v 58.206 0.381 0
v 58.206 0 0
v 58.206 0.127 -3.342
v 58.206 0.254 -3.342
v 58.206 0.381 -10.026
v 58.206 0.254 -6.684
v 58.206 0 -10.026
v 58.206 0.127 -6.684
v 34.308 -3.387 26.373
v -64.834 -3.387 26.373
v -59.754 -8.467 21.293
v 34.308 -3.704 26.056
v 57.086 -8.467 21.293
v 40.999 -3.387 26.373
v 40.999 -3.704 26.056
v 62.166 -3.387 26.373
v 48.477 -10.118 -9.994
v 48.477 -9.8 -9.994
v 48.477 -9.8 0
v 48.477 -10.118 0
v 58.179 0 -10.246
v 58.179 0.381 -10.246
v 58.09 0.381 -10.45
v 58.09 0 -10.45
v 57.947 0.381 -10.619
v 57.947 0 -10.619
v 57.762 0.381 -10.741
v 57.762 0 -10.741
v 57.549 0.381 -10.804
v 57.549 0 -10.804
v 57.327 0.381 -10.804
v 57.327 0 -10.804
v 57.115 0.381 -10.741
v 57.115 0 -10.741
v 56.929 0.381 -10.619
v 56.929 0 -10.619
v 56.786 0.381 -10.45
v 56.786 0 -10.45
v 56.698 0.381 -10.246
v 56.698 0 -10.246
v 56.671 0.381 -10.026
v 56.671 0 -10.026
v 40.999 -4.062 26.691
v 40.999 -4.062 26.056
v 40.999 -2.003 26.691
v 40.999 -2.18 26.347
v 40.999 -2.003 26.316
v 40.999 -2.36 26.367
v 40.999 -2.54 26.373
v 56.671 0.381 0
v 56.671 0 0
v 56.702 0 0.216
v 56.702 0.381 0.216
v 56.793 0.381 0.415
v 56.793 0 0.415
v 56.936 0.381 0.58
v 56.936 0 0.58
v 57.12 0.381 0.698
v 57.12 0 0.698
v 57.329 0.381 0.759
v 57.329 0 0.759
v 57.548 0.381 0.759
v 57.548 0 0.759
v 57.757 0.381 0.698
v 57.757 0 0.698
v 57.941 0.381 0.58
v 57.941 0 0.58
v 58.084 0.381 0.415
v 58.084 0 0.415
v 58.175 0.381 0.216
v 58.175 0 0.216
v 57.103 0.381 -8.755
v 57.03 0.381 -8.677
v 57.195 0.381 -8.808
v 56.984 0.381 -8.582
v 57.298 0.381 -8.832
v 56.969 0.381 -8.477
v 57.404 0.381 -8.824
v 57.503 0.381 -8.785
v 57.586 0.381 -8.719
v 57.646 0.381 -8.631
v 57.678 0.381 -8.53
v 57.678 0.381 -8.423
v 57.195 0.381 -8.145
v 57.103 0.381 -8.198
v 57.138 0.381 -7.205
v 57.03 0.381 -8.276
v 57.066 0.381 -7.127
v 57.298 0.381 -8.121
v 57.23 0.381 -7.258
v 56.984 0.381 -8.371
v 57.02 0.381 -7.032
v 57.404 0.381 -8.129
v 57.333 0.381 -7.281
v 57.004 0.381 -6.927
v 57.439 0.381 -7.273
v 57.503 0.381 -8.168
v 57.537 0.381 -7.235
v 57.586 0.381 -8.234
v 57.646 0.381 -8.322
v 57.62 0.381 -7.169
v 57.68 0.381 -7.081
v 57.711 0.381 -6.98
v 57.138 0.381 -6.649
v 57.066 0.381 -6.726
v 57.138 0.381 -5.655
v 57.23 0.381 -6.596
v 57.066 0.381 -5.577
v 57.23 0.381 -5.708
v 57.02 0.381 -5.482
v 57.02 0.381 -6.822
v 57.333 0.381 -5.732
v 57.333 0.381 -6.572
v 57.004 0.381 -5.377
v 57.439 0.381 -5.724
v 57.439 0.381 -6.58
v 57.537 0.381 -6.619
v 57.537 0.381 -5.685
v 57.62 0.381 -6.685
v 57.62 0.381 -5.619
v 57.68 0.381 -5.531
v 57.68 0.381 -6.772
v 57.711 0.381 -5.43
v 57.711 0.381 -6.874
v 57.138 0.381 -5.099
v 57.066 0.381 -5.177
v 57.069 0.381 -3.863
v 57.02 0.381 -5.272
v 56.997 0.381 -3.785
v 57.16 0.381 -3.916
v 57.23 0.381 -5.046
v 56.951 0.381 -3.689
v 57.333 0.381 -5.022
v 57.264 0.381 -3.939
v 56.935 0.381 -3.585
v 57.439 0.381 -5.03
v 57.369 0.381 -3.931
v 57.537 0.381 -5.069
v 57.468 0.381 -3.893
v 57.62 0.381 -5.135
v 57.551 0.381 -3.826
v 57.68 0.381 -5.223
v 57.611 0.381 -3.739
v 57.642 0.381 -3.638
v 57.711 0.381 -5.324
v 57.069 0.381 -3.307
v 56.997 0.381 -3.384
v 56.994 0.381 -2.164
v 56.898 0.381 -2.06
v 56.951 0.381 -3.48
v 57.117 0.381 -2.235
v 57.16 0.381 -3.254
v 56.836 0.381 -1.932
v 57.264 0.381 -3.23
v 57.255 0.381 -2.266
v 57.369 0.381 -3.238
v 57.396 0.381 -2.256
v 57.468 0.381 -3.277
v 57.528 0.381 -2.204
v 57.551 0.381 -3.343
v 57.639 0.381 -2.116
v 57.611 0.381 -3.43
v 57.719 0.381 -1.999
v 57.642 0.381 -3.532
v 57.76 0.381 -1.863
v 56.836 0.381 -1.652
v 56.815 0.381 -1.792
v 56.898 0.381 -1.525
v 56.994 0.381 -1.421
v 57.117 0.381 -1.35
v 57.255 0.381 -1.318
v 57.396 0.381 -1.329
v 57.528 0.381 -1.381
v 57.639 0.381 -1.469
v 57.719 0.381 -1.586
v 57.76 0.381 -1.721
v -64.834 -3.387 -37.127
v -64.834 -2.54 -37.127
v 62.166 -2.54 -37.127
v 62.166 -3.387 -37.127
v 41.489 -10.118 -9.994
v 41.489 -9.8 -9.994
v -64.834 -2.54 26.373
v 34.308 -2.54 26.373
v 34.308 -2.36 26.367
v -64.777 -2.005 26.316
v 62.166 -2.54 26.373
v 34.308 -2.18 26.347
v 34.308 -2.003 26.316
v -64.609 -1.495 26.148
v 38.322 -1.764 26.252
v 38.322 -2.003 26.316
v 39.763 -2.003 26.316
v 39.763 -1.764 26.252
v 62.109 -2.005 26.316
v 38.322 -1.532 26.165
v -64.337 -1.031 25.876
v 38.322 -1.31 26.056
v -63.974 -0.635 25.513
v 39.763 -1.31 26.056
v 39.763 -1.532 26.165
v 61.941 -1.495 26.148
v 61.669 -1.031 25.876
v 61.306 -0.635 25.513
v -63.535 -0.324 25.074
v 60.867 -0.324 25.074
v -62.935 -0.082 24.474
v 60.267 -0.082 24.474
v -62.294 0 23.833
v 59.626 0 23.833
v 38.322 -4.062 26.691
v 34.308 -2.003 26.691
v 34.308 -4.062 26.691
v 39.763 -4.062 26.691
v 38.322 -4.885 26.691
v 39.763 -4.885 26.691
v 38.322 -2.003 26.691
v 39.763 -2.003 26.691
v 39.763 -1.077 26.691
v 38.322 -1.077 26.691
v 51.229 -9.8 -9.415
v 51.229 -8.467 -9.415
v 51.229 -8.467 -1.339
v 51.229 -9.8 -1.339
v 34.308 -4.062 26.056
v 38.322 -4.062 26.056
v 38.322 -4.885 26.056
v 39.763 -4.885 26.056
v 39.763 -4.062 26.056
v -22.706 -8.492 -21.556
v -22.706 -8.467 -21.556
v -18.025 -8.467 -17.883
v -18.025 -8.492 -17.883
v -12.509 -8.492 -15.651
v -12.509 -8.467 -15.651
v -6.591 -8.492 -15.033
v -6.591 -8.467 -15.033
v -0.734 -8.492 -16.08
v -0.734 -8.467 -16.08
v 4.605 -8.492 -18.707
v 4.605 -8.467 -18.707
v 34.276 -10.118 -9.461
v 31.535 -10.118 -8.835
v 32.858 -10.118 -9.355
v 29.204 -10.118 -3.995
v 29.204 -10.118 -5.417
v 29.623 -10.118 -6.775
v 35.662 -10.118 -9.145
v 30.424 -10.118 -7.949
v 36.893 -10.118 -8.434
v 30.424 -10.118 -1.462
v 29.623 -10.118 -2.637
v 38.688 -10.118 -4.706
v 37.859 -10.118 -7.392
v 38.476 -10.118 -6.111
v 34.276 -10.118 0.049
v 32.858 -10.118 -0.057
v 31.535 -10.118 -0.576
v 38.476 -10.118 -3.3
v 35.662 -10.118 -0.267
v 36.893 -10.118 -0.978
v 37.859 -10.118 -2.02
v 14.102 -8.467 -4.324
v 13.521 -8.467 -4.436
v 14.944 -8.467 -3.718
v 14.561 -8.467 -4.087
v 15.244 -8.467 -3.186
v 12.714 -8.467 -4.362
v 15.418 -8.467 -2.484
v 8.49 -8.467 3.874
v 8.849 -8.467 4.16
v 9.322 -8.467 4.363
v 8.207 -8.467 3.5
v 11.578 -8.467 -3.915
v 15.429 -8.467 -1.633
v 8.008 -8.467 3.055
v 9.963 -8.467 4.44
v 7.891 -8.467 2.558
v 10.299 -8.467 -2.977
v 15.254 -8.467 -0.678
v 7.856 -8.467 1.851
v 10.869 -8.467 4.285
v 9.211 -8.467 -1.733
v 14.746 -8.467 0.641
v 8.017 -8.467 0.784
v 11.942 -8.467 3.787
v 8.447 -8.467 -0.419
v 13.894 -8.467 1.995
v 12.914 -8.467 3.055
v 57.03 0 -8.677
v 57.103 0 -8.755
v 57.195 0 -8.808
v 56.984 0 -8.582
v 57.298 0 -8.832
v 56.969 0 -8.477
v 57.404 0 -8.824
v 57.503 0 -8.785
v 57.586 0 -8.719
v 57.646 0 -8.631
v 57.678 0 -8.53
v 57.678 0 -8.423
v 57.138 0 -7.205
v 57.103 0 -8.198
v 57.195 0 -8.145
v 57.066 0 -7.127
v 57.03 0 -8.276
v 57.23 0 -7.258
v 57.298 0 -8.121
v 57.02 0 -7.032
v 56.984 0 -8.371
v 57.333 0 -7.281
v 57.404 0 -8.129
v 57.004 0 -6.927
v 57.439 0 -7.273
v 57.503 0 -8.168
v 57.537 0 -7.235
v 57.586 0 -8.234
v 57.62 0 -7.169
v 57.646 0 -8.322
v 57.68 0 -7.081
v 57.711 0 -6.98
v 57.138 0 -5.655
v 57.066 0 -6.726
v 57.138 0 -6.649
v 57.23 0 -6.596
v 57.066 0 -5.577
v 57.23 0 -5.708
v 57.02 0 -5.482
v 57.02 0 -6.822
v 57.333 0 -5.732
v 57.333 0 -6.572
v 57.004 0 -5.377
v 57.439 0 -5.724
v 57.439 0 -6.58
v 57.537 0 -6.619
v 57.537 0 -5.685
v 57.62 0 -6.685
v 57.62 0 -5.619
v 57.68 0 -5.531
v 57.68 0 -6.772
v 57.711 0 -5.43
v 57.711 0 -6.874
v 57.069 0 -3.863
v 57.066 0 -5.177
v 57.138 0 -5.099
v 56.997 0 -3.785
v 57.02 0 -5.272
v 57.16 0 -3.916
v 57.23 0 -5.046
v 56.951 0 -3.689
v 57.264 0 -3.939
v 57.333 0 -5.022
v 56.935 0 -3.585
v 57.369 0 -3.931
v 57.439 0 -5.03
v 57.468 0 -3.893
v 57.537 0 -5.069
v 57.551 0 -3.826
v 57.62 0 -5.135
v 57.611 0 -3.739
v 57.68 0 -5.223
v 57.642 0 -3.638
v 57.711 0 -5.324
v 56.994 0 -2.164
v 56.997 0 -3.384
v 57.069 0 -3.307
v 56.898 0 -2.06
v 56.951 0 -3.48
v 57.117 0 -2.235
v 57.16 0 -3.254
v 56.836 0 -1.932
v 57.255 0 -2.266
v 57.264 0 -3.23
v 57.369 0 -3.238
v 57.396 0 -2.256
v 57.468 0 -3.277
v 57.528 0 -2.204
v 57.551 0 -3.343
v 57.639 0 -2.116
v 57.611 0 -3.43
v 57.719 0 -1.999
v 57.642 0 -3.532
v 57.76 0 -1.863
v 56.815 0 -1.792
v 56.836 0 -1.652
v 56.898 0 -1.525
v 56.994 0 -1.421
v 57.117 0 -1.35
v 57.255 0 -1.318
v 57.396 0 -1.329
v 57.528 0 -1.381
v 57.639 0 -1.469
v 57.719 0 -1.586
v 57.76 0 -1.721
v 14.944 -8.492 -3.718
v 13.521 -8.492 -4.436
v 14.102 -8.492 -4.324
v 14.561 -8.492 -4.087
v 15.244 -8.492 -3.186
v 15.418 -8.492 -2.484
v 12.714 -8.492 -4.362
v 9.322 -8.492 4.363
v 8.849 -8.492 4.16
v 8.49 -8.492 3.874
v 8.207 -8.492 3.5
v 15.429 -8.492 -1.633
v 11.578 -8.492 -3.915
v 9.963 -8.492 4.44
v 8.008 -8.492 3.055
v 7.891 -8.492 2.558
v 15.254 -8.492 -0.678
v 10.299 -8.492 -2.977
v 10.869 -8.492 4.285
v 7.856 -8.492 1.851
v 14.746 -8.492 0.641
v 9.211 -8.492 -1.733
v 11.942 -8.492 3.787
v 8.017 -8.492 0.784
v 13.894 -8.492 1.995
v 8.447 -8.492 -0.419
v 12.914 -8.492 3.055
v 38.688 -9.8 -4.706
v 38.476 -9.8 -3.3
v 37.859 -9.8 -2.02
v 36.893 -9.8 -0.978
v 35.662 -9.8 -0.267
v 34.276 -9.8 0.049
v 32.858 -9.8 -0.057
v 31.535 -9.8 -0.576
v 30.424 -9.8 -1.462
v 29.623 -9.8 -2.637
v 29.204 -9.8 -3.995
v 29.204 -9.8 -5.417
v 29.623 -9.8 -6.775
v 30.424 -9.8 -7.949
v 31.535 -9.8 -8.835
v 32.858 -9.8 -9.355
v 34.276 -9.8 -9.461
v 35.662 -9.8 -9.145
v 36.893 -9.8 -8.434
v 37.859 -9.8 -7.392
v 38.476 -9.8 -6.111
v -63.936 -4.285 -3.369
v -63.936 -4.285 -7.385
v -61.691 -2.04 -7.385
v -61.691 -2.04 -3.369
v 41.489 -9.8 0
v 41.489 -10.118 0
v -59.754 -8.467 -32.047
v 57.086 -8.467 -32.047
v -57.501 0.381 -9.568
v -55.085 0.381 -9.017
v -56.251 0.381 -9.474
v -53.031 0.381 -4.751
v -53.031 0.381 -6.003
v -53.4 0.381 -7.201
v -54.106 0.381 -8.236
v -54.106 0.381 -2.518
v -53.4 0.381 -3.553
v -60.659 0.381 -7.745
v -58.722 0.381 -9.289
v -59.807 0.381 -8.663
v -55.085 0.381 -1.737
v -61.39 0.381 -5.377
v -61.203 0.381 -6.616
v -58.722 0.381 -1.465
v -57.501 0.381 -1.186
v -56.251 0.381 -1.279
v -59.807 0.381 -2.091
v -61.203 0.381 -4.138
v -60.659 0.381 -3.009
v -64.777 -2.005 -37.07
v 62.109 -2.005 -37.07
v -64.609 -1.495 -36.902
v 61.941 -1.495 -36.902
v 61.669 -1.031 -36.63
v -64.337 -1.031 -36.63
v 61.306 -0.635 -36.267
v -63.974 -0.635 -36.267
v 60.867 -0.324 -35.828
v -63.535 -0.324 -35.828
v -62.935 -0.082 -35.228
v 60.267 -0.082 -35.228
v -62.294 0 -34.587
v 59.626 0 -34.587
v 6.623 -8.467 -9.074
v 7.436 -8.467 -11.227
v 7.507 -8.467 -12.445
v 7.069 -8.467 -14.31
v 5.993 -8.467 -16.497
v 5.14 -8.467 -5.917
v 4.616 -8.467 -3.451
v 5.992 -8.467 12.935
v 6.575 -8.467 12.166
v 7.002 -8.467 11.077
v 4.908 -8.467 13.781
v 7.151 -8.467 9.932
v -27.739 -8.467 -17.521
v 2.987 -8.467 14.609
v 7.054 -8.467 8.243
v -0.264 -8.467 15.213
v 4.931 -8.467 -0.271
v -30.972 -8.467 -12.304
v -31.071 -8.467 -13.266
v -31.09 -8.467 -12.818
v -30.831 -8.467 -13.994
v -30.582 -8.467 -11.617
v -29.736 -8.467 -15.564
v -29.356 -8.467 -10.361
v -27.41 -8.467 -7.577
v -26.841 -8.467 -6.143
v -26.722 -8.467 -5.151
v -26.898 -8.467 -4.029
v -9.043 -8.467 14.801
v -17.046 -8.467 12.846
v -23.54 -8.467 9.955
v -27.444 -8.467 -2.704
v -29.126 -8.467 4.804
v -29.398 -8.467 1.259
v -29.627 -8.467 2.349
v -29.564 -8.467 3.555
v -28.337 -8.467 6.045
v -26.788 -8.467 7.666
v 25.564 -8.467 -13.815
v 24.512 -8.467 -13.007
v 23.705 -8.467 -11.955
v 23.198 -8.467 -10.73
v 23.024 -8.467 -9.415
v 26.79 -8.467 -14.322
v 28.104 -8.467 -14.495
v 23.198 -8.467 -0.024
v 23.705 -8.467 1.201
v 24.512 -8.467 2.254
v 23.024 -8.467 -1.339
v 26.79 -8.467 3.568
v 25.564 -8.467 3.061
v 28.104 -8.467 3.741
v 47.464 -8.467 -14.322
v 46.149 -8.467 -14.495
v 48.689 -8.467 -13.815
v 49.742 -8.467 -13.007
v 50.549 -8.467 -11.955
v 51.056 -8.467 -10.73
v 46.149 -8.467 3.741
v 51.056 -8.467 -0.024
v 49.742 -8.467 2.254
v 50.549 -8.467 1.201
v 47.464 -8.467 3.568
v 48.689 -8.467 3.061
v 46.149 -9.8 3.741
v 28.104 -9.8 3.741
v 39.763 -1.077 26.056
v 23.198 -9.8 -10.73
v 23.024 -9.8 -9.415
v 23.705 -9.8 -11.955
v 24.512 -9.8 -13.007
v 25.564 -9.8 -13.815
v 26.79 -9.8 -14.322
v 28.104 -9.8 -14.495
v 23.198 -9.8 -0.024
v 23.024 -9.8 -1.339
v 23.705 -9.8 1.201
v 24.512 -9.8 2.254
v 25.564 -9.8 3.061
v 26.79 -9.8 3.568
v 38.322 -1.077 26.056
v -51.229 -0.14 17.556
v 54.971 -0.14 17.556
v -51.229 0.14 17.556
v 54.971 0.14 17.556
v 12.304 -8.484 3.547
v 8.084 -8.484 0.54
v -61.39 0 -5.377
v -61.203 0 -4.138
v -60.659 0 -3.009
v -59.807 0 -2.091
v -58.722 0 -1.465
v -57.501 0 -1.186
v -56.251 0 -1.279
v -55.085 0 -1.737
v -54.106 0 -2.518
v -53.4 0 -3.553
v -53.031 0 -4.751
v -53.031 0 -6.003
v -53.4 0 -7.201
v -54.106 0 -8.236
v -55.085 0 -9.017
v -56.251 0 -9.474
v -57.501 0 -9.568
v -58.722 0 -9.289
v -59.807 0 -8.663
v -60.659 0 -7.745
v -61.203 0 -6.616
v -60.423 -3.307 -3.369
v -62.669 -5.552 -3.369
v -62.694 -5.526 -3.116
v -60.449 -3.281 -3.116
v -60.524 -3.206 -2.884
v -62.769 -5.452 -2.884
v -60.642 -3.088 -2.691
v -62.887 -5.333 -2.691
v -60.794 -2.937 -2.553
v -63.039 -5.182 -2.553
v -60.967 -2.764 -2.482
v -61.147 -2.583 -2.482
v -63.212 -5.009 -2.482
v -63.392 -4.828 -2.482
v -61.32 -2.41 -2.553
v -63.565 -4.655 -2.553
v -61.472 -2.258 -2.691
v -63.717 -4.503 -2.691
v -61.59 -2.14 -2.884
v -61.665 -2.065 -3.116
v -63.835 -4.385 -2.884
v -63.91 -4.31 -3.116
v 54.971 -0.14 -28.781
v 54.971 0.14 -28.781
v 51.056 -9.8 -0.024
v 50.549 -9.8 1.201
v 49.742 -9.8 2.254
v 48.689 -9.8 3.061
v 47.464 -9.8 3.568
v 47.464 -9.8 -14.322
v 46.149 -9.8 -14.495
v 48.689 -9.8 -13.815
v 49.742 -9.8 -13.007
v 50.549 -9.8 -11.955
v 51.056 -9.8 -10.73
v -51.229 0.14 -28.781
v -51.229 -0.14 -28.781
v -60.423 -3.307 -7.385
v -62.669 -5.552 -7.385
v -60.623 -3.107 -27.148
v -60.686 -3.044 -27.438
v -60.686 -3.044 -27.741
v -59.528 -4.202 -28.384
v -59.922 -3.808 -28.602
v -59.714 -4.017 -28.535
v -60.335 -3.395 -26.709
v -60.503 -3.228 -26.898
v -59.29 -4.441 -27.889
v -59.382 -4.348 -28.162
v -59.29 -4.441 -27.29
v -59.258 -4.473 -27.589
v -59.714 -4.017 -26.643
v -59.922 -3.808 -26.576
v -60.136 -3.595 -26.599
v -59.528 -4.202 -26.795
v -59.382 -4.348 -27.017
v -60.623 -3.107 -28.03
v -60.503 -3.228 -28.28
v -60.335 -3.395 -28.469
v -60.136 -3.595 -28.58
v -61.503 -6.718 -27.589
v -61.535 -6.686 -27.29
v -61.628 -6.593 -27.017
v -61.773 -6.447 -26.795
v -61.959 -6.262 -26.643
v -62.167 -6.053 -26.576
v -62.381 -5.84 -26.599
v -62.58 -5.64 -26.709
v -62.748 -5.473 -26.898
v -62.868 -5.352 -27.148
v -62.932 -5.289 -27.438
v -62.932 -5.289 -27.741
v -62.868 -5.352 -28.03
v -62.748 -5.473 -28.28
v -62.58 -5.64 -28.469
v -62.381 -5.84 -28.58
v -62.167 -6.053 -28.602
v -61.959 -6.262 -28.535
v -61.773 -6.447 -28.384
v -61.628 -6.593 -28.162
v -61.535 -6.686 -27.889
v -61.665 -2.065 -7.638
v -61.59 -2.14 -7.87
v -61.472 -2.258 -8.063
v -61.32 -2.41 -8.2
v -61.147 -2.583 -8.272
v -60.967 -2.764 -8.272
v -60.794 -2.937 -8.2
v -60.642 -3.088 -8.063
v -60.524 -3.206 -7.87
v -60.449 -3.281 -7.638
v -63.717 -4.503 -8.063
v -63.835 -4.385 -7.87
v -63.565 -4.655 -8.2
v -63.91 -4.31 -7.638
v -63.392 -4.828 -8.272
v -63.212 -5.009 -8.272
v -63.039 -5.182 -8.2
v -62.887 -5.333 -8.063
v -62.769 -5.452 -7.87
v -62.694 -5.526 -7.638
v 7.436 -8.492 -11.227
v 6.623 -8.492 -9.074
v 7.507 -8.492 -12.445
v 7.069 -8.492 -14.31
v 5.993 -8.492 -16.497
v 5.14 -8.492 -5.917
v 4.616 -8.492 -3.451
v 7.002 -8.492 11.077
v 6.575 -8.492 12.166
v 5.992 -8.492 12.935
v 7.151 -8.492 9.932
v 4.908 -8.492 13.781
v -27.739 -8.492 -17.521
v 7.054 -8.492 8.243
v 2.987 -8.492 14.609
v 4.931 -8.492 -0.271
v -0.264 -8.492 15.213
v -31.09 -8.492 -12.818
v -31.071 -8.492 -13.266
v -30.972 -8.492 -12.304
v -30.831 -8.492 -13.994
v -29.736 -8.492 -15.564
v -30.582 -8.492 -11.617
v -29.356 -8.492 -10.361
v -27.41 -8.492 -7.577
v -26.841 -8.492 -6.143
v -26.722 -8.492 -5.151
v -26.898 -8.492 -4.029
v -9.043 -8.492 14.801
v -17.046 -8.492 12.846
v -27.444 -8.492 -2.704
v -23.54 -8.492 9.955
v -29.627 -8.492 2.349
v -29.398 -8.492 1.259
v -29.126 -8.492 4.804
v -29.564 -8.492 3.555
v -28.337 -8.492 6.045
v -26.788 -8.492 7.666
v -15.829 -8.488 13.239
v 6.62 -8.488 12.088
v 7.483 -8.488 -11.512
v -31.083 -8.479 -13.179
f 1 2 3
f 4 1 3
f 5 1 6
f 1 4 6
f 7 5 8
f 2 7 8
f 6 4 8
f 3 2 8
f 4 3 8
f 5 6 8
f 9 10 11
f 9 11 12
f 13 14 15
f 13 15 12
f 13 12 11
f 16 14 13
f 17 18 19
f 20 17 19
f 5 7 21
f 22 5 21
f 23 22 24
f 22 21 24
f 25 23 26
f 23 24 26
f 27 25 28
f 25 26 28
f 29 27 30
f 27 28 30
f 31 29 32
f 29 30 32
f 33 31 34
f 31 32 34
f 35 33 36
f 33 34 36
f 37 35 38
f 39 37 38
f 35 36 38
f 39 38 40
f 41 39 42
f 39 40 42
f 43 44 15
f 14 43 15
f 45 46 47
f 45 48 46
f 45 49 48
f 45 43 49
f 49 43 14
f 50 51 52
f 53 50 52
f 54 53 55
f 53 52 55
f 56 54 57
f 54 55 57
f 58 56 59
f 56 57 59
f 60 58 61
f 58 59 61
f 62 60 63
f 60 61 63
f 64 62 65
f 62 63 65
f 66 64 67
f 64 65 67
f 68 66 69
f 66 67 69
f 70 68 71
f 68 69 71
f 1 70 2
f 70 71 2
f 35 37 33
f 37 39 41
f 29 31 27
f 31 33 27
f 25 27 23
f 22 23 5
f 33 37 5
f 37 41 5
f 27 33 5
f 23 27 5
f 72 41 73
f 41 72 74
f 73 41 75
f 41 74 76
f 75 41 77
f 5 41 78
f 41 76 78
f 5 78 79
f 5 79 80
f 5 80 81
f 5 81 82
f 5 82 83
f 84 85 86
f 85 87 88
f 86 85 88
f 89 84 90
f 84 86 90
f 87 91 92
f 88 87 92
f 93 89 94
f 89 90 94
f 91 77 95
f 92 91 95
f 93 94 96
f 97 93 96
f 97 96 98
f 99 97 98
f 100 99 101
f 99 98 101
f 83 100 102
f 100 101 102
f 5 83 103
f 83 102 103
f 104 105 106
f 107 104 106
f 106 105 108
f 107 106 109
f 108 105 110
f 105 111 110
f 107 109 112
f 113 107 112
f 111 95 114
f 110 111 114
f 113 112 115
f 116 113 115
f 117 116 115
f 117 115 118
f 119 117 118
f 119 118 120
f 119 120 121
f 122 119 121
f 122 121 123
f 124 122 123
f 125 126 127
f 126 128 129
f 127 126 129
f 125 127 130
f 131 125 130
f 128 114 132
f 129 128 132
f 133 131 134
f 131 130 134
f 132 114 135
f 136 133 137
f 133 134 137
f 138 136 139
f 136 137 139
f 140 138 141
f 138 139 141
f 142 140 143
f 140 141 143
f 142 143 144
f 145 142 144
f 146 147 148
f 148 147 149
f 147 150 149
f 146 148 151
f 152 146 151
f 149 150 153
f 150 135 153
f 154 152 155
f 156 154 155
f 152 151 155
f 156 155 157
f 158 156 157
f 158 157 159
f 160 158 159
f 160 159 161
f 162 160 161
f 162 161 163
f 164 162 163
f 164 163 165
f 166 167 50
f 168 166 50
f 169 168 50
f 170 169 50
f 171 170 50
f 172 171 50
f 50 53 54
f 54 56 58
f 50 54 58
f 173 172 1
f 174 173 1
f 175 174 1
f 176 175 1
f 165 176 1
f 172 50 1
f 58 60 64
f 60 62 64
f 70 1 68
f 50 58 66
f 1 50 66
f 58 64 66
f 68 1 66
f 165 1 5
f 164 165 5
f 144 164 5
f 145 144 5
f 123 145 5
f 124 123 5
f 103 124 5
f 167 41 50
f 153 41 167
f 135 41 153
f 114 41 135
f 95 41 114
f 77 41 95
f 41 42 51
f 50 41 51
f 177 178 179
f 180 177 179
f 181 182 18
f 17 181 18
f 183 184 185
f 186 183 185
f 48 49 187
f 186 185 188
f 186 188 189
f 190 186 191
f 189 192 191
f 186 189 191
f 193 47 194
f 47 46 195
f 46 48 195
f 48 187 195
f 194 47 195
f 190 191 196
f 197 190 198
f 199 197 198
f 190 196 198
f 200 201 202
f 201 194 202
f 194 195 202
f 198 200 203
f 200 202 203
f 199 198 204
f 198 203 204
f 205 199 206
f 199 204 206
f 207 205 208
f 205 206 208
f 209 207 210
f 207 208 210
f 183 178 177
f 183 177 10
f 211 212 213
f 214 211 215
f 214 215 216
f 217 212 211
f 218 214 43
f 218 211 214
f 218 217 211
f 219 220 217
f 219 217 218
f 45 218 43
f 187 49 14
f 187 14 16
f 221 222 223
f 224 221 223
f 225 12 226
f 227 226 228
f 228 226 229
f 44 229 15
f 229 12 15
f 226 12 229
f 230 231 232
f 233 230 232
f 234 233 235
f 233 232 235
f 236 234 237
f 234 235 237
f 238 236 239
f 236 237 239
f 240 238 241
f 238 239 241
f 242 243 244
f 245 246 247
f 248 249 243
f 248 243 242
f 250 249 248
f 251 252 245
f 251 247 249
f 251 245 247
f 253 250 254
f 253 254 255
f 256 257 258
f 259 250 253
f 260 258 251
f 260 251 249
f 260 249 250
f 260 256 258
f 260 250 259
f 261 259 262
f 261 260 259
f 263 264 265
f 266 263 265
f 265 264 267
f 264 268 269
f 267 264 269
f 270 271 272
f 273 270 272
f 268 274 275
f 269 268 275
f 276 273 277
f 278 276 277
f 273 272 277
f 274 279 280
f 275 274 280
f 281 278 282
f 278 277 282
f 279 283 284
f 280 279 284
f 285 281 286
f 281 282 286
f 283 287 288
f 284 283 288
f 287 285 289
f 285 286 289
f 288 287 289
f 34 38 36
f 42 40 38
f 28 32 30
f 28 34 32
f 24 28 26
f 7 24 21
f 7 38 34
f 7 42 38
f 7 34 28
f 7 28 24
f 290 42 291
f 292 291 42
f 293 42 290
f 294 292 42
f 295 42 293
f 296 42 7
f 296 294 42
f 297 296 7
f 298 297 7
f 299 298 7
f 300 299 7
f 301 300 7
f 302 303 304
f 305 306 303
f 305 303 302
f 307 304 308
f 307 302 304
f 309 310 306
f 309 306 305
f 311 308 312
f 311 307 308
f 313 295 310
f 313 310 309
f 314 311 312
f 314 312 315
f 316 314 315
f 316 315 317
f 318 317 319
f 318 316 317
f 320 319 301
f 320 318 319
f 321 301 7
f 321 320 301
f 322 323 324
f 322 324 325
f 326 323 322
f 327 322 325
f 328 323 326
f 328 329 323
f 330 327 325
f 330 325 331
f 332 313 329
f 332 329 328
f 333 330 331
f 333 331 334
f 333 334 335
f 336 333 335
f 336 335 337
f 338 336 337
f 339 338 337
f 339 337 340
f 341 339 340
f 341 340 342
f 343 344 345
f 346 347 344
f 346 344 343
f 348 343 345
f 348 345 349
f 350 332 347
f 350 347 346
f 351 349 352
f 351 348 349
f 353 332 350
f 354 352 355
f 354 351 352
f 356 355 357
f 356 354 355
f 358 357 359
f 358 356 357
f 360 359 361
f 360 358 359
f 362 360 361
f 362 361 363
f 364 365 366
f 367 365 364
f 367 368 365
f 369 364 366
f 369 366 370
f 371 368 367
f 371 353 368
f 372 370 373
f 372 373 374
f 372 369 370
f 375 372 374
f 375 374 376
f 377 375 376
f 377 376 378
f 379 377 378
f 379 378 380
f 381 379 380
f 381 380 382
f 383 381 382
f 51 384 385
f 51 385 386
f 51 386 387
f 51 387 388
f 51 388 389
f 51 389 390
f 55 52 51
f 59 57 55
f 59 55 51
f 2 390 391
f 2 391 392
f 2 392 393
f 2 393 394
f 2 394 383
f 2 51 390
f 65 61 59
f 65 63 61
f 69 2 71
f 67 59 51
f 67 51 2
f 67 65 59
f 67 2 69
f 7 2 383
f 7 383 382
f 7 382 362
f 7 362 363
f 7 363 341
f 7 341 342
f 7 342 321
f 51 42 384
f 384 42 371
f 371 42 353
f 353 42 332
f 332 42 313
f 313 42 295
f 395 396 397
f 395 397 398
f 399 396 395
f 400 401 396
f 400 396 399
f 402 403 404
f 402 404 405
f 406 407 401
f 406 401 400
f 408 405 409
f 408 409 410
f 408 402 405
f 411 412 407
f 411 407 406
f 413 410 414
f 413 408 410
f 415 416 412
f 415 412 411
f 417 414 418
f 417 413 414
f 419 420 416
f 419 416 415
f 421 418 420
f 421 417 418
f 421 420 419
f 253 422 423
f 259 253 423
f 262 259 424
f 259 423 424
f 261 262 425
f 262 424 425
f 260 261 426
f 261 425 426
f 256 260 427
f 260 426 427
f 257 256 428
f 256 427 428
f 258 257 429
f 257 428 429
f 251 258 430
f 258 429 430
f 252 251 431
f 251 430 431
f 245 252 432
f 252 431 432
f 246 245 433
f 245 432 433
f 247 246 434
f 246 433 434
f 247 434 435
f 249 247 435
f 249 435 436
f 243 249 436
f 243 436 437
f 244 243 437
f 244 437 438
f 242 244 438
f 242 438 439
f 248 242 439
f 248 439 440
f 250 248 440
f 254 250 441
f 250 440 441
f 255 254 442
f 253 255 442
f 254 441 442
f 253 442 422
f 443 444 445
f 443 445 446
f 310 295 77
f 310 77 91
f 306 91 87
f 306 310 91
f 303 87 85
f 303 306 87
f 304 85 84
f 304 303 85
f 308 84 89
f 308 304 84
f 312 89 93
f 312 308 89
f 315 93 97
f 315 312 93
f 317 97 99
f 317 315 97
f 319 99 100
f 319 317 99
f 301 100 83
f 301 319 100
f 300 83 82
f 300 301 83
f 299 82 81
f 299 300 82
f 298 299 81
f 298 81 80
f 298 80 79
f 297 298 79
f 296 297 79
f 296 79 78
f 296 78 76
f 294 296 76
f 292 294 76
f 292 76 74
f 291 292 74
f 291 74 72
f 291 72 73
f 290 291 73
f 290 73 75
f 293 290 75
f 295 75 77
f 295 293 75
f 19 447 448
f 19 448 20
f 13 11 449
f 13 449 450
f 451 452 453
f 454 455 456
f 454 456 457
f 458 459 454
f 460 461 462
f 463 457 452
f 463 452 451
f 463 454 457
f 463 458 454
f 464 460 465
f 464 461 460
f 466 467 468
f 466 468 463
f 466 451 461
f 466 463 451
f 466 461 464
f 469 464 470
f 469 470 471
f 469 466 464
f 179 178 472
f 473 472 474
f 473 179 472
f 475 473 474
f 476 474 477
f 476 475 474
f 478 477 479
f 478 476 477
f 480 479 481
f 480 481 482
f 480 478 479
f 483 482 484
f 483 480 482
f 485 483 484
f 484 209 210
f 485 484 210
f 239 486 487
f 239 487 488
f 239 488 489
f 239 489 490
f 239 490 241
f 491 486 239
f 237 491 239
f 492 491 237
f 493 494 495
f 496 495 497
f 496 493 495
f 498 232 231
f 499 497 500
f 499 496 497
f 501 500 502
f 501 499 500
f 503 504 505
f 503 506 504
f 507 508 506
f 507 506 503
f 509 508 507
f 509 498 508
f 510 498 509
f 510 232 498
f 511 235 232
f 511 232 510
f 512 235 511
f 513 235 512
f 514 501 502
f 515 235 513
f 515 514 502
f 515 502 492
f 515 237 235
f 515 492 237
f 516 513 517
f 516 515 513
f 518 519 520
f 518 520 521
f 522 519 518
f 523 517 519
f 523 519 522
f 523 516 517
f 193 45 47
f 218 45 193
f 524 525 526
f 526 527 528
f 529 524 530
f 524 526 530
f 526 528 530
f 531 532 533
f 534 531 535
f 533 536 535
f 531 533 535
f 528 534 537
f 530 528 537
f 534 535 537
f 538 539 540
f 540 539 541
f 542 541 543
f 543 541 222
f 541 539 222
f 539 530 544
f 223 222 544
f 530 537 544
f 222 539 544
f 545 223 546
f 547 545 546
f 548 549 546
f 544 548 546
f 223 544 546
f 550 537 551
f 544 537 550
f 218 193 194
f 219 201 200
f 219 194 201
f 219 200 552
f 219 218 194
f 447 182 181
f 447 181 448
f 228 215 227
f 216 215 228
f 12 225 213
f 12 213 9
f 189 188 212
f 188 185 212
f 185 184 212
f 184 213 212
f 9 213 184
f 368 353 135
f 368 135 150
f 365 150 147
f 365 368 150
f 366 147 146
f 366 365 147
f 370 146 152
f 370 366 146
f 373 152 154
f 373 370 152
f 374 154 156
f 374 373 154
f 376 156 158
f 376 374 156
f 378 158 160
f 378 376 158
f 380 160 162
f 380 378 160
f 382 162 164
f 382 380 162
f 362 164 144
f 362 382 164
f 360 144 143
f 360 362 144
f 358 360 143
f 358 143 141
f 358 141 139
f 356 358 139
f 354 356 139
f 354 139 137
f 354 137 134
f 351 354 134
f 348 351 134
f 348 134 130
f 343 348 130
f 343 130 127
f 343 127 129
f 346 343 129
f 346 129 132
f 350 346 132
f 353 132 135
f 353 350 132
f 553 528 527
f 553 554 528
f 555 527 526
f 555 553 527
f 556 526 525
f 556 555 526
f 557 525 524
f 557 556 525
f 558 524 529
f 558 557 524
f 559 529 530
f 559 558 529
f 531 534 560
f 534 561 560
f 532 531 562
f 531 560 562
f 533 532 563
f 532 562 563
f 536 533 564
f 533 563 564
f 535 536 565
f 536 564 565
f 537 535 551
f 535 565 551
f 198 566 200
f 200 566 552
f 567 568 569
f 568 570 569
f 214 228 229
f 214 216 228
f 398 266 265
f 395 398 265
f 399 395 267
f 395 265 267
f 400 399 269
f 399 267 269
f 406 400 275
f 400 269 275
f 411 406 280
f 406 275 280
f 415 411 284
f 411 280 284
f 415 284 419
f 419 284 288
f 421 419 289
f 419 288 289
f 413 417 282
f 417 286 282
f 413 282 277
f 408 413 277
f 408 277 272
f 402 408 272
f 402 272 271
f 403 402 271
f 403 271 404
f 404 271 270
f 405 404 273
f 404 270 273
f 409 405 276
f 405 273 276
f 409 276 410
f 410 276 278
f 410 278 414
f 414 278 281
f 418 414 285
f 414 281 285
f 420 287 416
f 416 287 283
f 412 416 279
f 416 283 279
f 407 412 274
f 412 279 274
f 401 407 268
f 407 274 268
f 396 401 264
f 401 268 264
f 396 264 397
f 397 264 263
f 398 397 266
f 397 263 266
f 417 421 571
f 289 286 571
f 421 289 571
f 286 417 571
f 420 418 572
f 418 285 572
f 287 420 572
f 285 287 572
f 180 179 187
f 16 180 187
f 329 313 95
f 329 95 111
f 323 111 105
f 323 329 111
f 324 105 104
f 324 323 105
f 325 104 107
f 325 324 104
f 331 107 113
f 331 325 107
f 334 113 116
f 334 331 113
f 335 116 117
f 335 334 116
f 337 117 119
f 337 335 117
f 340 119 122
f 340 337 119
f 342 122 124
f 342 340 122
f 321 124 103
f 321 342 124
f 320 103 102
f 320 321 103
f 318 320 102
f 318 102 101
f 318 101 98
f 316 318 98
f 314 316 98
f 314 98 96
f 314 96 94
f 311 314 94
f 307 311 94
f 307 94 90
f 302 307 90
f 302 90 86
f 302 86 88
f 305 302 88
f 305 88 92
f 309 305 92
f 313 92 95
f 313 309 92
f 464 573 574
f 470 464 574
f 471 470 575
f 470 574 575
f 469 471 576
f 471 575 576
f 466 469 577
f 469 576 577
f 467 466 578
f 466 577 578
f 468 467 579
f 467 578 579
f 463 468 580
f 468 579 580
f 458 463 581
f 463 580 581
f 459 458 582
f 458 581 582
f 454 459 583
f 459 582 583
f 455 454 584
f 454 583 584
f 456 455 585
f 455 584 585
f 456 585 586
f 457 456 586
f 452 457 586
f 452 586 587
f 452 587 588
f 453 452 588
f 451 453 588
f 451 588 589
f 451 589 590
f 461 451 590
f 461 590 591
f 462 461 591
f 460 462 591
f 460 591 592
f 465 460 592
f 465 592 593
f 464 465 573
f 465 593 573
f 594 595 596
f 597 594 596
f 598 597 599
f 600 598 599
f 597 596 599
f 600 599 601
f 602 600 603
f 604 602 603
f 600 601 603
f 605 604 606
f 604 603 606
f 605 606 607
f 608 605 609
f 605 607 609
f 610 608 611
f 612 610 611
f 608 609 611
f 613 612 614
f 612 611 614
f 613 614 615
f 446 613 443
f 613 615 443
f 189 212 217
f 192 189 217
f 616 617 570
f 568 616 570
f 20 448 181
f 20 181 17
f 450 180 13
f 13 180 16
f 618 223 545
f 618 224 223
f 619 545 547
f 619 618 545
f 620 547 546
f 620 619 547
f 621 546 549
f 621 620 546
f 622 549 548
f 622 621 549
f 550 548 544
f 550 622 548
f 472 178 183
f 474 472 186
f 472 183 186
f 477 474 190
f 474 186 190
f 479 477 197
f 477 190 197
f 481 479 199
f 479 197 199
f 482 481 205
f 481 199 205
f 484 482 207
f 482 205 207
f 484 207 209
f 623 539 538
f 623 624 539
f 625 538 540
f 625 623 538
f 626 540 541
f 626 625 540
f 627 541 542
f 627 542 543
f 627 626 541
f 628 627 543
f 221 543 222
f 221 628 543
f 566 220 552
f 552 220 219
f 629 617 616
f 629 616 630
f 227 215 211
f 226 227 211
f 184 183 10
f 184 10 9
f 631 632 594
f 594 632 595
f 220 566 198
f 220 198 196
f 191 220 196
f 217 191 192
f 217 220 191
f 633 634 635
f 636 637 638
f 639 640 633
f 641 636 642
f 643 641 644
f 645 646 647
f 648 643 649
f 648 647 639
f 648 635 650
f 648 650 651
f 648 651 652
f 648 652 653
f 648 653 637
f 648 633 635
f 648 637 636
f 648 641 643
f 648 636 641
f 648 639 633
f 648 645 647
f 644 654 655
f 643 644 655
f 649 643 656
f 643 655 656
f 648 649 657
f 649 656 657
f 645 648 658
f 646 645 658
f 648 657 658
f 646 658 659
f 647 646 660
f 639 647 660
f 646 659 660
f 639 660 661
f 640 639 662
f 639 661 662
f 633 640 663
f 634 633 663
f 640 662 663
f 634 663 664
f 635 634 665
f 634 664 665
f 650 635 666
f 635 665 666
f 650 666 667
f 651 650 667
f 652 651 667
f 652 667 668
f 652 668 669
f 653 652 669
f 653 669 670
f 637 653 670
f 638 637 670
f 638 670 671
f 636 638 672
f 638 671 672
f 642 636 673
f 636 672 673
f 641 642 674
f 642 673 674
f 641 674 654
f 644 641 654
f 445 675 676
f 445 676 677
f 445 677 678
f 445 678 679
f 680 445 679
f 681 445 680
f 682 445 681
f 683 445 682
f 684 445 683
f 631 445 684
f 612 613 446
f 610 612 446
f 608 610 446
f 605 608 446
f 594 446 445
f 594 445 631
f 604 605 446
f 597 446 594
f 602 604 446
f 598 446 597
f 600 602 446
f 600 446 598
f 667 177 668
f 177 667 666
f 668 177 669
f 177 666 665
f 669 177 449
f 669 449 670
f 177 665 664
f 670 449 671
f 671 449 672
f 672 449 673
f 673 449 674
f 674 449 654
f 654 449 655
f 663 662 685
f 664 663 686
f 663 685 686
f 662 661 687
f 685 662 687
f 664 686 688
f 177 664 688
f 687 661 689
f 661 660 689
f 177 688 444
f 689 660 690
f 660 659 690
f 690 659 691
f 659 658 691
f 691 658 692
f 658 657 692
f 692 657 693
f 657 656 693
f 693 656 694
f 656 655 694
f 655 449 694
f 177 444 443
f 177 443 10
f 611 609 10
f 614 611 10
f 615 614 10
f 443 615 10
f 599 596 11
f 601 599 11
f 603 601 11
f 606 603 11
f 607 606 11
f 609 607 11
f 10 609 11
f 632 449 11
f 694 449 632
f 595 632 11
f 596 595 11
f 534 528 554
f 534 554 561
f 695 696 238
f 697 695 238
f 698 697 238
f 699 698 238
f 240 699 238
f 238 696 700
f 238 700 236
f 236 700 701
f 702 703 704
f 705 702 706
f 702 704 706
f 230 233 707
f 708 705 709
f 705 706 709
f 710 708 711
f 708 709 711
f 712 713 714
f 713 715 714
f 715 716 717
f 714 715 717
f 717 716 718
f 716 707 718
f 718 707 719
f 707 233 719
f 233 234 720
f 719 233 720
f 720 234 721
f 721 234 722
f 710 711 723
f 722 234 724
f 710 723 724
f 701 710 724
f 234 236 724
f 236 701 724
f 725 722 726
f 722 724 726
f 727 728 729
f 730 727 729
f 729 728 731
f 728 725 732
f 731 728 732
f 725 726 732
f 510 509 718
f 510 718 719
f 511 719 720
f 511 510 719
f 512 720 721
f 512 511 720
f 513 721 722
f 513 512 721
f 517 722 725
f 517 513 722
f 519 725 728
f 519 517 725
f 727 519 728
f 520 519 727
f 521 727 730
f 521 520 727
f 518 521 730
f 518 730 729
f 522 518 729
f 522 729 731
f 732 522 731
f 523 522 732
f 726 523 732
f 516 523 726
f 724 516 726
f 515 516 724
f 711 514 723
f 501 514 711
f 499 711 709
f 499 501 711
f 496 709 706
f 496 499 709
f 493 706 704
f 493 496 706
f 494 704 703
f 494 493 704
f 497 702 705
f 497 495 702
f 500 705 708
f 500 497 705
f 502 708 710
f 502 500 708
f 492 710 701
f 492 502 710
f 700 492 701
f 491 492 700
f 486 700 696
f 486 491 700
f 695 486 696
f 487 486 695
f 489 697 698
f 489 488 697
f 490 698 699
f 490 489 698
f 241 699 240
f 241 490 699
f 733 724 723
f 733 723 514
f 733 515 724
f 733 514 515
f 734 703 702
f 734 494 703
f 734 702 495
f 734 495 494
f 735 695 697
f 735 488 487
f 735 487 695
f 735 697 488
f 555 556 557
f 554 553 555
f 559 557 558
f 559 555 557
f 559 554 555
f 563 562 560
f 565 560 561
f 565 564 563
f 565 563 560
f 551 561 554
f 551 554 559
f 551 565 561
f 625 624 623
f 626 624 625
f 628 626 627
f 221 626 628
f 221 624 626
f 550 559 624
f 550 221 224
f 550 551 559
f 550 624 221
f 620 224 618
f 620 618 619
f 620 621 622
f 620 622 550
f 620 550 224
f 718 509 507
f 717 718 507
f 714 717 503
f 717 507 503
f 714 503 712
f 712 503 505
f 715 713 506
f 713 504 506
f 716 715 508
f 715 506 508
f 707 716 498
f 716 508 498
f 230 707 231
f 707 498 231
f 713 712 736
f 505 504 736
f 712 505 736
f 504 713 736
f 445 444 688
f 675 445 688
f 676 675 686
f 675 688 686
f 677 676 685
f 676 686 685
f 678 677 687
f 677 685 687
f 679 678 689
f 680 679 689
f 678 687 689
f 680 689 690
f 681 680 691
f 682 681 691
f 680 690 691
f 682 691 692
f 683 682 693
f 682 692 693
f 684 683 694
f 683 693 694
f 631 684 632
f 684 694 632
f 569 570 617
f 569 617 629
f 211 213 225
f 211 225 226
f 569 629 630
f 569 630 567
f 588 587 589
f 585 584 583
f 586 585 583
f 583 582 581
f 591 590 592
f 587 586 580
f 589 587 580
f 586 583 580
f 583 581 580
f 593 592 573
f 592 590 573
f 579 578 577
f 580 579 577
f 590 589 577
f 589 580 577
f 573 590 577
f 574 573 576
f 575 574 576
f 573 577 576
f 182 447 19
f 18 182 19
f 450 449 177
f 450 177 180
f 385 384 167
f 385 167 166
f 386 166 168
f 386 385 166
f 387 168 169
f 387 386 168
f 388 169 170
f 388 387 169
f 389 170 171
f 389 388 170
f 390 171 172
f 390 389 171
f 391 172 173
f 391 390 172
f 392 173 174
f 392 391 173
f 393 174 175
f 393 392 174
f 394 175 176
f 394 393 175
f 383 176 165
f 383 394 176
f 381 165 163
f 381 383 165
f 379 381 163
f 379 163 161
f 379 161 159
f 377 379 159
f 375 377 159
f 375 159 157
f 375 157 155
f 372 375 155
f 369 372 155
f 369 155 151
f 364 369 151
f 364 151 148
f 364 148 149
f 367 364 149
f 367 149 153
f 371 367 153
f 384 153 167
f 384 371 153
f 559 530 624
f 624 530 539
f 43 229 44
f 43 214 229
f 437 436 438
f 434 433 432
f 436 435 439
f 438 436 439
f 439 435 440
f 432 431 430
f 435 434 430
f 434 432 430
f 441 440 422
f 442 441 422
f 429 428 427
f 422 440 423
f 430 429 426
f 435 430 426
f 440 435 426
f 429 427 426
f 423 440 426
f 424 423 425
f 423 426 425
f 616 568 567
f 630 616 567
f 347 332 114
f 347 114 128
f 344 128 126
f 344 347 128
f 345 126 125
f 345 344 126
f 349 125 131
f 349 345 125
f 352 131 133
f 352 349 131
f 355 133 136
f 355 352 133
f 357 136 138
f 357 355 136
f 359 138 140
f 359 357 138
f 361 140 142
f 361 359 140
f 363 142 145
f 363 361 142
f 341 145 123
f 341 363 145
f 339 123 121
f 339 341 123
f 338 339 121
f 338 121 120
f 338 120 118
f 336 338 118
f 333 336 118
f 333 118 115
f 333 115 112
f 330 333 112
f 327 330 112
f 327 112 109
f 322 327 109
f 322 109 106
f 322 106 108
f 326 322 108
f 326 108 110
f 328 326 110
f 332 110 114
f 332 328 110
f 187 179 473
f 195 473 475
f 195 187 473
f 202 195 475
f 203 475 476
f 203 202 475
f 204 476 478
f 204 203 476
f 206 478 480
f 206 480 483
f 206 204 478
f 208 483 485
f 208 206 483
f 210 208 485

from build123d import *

# Parameters (mm, degrees)
F0_W      = 127
F0_H      = 63.5
F1_DEPTH  = 8.4666666667
F2_R      = 2.54
F3_W      = 106.2003225088
F3_H      = 46.3367272168
F4_DEPTH  = 0.1397
F5_SIZE   = 5.08
F6_R      = 4.2028856968
F7_DEPTH  = 0.381
F8_R      = 0.356508333
F8_R_2    = 0.3556
F8_R_3    = 0.4752442837
F9_DEPTH  = 0.381
F10_W     = 28.2049626112
F10_H     = 18.2368370481
F11_DEPTH = 1.3335
F12_R     = 5.08
F13_W     = 6.9876015186
F13_H     = 9.993921034
F14_DEPTH = 0.3175
F13_R     = 4.7685535727
F15_W     = 1.7923414707
F15_H     = 4.0167168006
F16_DEPTH = 3.175
F17_R     = 1.016
F18_DEPTH = 3.175
F19_W     = 1.2352466583
F19_H     = 2.0587400068
F19_W_2   = 1.4411173761
F19_H_2   = 0.9264331311
F19_W_3   = 4.014544189
F19_H_3   = 0.8234963752
F20_DEPTH = 0.3175
F22_DEPTH = 0.0254


with BuildPart() as f1:
    # F0 (on Front) → F1 (new body)
    with BuildSketch(Plane.XZ):
        with Locations((-1.3339536488, -5.376943469)):
            Rectangle(F0_W, F0_H)
    extrude(amount=F1_DEPTH)

    # F2
    f2_edges = [f1.edges().sort_by_distance(p)[0] for p in [
        (-1.333954, 0, 26.373057),
        (-64.833954, 0, -5.376943),
        (-1.333954, 0, -37.126943),
        (62.166046, 0, -5.376943),
    ]]
    fillet(f2_edges, radius=F2_R)

    # F5
    f5_edges = [f1.edges().sort_by_distance(p)[0] for p in [
        (-64.833954, -2.54, -5.376943),
        (-64.833954, -8.466667, -5.376943),
        (-1.333954, -8.466667, 26.373057),
        (-1.333954, -8.466667, -37.126943),
        (62.166046, -8.466667, -5.376943),
    ]]
    chamfer(f5_edges, length=F5_SIZE)

    # F15 (on face) → F16 (cut)
    with BuildSketch(Plane(origin=(-34.1103101577, -34.1103101577, 0), x_dir=(0.7071067812, -0.7071067812, 0), z_dir=(-0.7071067812, -0.7071067812, 0))):
        with BuildLine():
            ThreePointArc((-42.1797297895, -7.3853018694), (-41.2835590541, -8.2814726047), (-40.3873883188, -7.3853018694))
            Line((-40.3873883188, -7.3853018694), (-42.1797297895, -7.3853018694))
        make_face()
        with Locations((-41.2835590541, -5.376943469)):
            Rectangle(F15_W, F15_H)
        with BuildLine():
            Line((-42.1797297895, -3.3685850687), (-40.3873883188, -3.3685850687))
            ThreePointArc((-40.3873883188, -3.3685850687), (-41.2835590541, -2.4724143334), (-42.1797297895, -3.3685850687))
        make_face()
    extrude(amount=-F16_DEPTH, mode=Mode.SUBTRACT)

    # F17 (on face) → F18 (cut)
    with BuildSketch(Plane(origin=(-34.1103101577, -34.1103101577, 0), x_dir=(0.7071067812, -0.7071067812, 0), z_dir=(-0.7071067812, -0.7071067812, 0))):
        with Locations((-39.754666388, -27.5892131031)):
            Circle(F17_R)
    extrude(amount=-F18_DEPTH, mode=Mode.SUBTRACT)

    # F19 (on face) → F20 (join, symmetric)
    with BuildSketch(Plane.XY.offset(26.373056531)):
        with Locations((40.3811186552, -3.0323684914)):
            Rectangle(F19_W, F19_H)
        with Locations((39.042936638, -3.0323684914)):
            Rectangle(F19_W_2, F19_H)
        with Locations((39.042936638, -1.5397819225)):
            Rectangle(F19_W_2, F19_H_2)
        with Locations((36.3151058555, -3.0323684914)):
            Rectangle(F19_W_3, F19_H)
        with Locations((39.042936638, -4.4734866824)):
            Rectangle(F19_W_2, F19_H_3)
    extrude(amount=F20_DEPTH, both=True)


with BuildPart() as f4:
    # F3 (on face) → F4 (new body, symmetric)
    with BuildSketch(Plane(origin=(0, 0, 0), x_dir=(-1, 0, 0), z_dir=(0, 1, 0))):
        with Locations((-1.8707364798, -5.6122122332)):
            Rectangle(F3_W, F3_H)
    extrude(amount=F4_DEPTH, both=True)


with BuildPart() as f7:
    # F6 (on face) → F7 (new body)
    with BuildSketch(Plane(origin=(0, 0, 0), x_dir=(-1, 0, 0), z_dir=(0, 1, 0))):
        with Locations((57.1867190301, -5.376943469)):
            Circle(F6_R)
    extrude(amount=F7_DEPTH)


with BuildPart() as f9:
    # F8 (on face) → F9 (new body)
    with BuildSketch(Plane(origin=(0, 0, 0), x_dir=(-1, 0, 0), z_dir=(0, 1, 0))):
        with BuildLine():
            add(Edge.make_bspline(
                [(-58.2055896521, -5.376943469), (-58.2055896521, -3.5846289794), (-58.2055896521, -1.7923144897), (-58.2055896521, 0)],
                knots=[0, 0, 0, 0, 5.376943469, 5.376943469, 5.376943469, 5.376943469], degree=3))
            add(Edge.make_bspline(
                [(-58.2055896521, -5.376943469), (-58.2055896521, -6.9267380908), (-58.2055896521, -8.4765327126), (-58.2055896521, -10.0263273343)],
                knots=[0, 0, 0, 0, 4.6493838653, 4.6493838653, 4.6493838653, 4.6493838653], degree=3))
            ThreePointArc((-58.2055896521, -10.0263273343), (-57.4383437634, -10.812175597), (-56.6710978746, -10.0263273343))
            Line((-56.6710978746, -10.0263273343), (-56.6710978746, 0))
            ThreePointArc((-56.6710978746, 0), (-57.4383437634, 0.7672458887), (-58.2055896521, 0))
        make_face()
        with Locations((-57.3250167072, -8.4765327126)):
            Circle(F8_R, mode=Mode.SUBTRACT)
        with Locations((-57.3596656322, -6.9267380908)):
            Circle(F8_R_2, mode=Mode.SUBTRACT)
        with Locations((-57.3596656322, -5.376943469)):
            Circle(F8_R_2, mode=Mode.SUBTRACT)
        with Locations((-57.2903640568, -3.5846289794)):
            Circle(F8_R_2, mode=Mode.SUBTRACT)
        with Locations((-57.2903640568, -1.7923144897)):
            Circle(F8_R_3, mode=Mode.SUBTRACT)
    extrude(amount=F9_DEPTH)


with BuildPart() as f11:
    # F10 (on face) → F11 (new body)
    with BuildSketch(Plane.XZ.offset(8.4666666667)):
        with Locations((37.126943469, -5.376943469)):
            Rectangle(F10_W, F10_H)
    extrude(amount=F11_DEPTH)

    # F12
    f12_edges = [f11.edges().sort_by_distance(p)[0] for p in [
        (51.229425, -9.133417, -14.495362),
        (51.229425, -9.133417, 3.741475),
        (23.024462, -9.133417, -14.495362),
        (23.024462, -9.133417, 3.741475),
    ]]
    fillet(f12_edges, radius=F12_R)


with BuildPart() as f14:
    # F13 (on face) → F14 (new body)
    with BuildSketch(Plane.XZ.offset(9.8001666667)):
        with Locations((44.9830889702, -4.996960517)):
            Rectangle(F13_W, F13_H)
    extrude(amount=F14_DEPTH)


with BuildPart() as f14b:
    # F13 (on face) → F14, piece 2 (new body)
    with BuildSketch(Plane.XZ.offset(9.8001666667)):
        with Locations((33.919390291, -4.7058109194)):
            Circle(F13_R)
    extrude(amount=F14_DEPTH)


with BuildPart() as f22:
    # F21 (on face) → F22 (new body)
    with BuildSketch(Plane.XZ.offset(8.4666666667)):
        with BuildLine():
            add(Edge.make_bspline(
                [(-29.3561872095, -10.3610064834), (-27.9023607324, -8.5043653152), (-24.8100516889, -4.5552638469), (-33.5578495132, 3.962147113), (-16.8169005892, 15.5313912391), (13.5245889556, 16.8525969839), (1.4095976482, -3.6935297533), (9.4825015324, -11.211632561), (6.1950551378, -16.2636667767), (4.6048923396, -18.7073741108)],
                knots=[0, 0, 0, 0, 0.105040972, 0.2234236017, 0.3971629351, 0.595386368, 0.7593841976, 0.8836123082, 1, 1, 1, 1], degree=3))
            add(Edge.make_bspline(
                [(-29.3561872095, -10.3610064834), (-30.2861615246, -11.2078580395), (-32.9767839407, -13.6579878366), (-26.7685867487, -18.4320634412), (-22.7061621845, -21.5560495853)],
                knots=[0, 0, 0, 0, 0.3456353852, 1, 1, 1, 1], degree=3))
            ThreePointArc((-22.7061621845, -21.5560495853), (-9.5719059436, -15.1341396755), (4.6048923396, -18.7073741108))
        make_face()
    extrude(amount=F22_DEPTH)


with BuildPart() as f22b:
    # F21 (on face) → F22, piece 2 (new body)
    with BuildSketch(Plane.XZ.offset(8.4666666667)):
        with BuildLine():
            add(Edge.make_bspline(
                [(14.5610254258, -4.0870602243), (18.7811430537, -1.080775362), (12.3038360845, 3.5466725433), (5.8265291154, 8.1741204485), (8.0837184567, 0.540387681), (10.3409077979, -7.0933450865), (14.5610254258, -4.0870602243)],
                knots=[0, 0, 0, 2.0943951024, 2.0943951024, 4.1887902048, 4.1887902048, 6.2831853072, 6.2831853072, 6.2831853072], degree=2, weights=[1, 0.5, 1, 0.5, 1, 0.5, 1]))
        make_face()
    extrude(amount=F22_DEPTH)


solid = Compound([f1.part, f4.part, f7.part, f9.part, f11.part, f14.part, f14b.part, f22.part, f22b.part])
